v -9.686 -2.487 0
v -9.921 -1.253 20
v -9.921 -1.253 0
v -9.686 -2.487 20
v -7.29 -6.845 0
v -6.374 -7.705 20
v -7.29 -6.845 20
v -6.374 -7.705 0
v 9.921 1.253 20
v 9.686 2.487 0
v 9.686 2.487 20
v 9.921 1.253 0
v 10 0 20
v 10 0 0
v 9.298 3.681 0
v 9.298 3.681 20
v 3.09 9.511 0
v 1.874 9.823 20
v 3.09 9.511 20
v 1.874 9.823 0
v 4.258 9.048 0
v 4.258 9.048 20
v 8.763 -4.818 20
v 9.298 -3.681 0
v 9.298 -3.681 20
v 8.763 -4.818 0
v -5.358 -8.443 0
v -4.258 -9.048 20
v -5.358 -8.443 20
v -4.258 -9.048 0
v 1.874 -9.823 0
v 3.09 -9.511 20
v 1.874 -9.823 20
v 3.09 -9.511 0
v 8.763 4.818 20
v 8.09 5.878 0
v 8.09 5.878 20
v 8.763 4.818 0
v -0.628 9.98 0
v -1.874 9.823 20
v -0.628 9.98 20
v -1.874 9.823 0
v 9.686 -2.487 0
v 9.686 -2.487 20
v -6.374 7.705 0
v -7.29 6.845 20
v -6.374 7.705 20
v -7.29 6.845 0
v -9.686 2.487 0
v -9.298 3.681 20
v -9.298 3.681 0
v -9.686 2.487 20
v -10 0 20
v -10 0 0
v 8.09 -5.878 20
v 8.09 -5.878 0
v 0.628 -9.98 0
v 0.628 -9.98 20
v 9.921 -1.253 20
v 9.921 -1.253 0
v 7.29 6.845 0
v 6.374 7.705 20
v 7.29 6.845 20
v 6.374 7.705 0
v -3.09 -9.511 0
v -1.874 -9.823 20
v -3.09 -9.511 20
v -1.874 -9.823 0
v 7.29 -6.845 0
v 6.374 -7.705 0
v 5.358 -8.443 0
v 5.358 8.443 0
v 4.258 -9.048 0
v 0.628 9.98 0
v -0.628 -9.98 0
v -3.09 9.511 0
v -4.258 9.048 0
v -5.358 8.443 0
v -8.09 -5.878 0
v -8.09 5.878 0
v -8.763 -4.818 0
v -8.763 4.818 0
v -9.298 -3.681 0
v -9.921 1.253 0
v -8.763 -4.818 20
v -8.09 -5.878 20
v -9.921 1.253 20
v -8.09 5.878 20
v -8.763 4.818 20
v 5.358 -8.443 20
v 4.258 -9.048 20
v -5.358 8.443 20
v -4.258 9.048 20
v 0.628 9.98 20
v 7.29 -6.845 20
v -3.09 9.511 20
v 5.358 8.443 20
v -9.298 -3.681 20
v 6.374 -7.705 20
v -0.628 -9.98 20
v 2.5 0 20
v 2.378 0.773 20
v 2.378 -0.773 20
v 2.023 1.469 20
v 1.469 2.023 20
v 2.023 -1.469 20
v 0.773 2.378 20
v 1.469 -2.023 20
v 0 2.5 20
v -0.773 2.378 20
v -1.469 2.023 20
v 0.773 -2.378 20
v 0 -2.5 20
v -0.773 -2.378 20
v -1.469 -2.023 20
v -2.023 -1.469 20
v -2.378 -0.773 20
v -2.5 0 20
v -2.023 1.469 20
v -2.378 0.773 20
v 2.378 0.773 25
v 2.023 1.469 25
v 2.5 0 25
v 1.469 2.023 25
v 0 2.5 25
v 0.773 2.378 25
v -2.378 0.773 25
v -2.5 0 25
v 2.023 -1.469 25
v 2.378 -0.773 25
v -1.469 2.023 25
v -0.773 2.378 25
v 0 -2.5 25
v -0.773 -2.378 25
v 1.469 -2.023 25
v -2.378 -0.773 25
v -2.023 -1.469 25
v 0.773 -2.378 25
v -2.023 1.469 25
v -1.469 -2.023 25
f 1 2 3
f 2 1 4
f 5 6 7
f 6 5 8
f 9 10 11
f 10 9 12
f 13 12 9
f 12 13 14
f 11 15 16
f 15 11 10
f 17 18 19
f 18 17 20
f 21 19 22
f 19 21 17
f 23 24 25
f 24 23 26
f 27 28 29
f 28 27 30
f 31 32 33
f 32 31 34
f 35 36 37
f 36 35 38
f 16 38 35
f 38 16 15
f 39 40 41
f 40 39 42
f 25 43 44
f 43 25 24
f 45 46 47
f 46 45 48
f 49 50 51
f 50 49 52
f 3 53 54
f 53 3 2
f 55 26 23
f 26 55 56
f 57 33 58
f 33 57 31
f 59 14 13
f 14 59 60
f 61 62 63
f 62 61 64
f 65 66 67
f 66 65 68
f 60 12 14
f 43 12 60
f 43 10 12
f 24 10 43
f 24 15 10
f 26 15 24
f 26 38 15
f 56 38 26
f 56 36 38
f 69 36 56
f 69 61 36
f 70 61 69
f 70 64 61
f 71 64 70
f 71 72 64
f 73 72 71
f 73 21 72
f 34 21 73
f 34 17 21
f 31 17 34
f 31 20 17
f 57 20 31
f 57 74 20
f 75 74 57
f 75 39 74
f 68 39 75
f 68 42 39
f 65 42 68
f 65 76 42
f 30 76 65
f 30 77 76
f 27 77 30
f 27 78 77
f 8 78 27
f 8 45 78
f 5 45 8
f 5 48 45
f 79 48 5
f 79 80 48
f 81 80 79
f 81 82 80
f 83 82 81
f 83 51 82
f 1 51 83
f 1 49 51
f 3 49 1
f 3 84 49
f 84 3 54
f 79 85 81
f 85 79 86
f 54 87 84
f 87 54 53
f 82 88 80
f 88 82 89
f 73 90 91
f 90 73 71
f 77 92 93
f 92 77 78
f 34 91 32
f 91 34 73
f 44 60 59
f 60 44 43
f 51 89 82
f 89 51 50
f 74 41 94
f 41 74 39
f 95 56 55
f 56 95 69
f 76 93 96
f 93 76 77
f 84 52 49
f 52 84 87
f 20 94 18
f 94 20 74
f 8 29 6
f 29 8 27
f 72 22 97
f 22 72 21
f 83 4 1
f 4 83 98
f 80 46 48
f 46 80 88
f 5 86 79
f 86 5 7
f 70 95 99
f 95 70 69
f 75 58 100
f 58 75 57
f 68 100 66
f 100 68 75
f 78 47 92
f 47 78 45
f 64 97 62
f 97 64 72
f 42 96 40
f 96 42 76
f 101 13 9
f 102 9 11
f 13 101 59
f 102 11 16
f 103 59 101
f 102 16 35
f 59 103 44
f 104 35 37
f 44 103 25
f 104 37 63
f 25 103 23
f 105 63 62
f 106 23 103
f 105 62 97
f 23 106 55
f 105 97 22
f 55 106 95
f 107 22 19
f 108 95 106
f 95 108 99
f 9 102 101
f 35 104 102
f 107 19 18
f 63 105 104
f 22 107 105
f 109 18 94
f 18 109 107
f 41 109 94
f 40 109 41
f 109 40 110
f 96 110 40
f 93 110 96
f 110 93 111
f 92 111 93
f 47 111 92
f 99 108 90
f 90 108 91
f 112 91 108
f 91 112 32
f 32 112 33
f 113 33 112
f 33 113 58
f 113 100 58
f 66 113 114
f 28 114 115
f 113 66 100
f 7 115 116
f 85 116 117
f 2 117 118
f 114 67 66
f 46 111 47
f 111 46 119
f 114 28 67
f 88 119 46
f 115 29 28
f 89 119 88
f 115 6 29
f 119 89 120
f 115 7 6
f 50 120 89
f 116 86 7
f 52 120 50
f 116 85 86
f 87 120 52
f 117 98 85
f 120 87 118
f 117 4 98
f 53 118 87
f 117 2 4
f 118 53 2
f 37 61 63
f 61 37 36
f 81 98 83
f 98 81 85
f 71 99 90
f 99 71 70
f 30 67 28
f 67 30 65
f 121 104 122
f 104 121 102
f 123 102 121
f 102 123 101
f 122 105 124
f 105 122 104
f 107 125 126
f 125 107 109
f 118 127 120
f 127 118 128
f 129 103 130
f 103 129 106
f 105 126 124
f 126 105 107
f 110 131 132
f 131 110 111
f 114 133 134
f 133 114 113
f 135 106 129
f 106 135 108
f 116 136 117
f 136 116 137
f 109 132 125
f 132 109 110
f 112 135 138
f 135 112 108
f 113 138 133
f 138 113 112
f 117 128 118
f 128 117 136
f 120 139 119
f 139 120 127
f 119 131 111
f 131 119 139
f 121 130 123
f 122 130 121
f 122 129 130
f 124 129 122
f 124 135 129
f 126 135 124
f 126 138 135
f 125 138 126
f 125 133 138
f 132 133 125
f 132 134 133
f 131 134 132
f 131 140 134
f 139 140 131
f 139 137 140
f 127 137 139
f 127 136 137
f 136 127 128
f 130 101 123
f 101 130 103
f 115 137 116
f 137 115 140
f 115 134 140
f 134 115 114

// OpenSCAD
type=2;
toparm=30;
botarm=20;
holesize=5;
hoff=2;
negative=0;
if(type==2)
{
  cylinder(d=20,h=20,$fn=50);
  cylinder(d=holesize,h=25,$fn=20);
} else {
difference() {
  union() {
    if(!negative)
    translate([0,0,5.5]) intersection(){
      translate([-6,0]) cube(20);
      translate([0,13,2]) rotate([0,-90]) cylinder(d=holesize,h=6,$fn=30);
    }
    translate([0,0,0]) linear_extrude(15,convexity=3) polygon([[0,0],[toparm-10,0],[0,10]]);
    *intersection(){
      cube(20);
    translate([2.4,2.4]) cylinder(d1=0,d2=20,h=6,$fn=4);
    }
    linear_extrude(15,convexity=3) {
      difference() {
      square([toparm,20]);
      translate([2.5,2.5]) square([toparm,18]);
      }
      translate([1.25,20]) circle(d=2.5,$fn=12);
      translate([toparm,1.25]) circle(d=2.5,$fn=12);
    }
  }
  if(negative)
  {
      translate([10,13+hoff,7.5]) rotate([0,-90]) cylinder(d=holesize,h=16,$fn=30);
      translate([toparm-7+hoff,13,7.5]) rotate([90,0]) cylinder(d=holesize,h=16,$fn=30);
  }
  *translate([-.01,13,7.5]) rotate([0,90,0]) cylinder(d=5,h=10,$fn=20);
  *translate([13,-.01,7.5]) rotate([-90,0]) cylinder(d=5,h=2.02,$fn=20);
}
}
